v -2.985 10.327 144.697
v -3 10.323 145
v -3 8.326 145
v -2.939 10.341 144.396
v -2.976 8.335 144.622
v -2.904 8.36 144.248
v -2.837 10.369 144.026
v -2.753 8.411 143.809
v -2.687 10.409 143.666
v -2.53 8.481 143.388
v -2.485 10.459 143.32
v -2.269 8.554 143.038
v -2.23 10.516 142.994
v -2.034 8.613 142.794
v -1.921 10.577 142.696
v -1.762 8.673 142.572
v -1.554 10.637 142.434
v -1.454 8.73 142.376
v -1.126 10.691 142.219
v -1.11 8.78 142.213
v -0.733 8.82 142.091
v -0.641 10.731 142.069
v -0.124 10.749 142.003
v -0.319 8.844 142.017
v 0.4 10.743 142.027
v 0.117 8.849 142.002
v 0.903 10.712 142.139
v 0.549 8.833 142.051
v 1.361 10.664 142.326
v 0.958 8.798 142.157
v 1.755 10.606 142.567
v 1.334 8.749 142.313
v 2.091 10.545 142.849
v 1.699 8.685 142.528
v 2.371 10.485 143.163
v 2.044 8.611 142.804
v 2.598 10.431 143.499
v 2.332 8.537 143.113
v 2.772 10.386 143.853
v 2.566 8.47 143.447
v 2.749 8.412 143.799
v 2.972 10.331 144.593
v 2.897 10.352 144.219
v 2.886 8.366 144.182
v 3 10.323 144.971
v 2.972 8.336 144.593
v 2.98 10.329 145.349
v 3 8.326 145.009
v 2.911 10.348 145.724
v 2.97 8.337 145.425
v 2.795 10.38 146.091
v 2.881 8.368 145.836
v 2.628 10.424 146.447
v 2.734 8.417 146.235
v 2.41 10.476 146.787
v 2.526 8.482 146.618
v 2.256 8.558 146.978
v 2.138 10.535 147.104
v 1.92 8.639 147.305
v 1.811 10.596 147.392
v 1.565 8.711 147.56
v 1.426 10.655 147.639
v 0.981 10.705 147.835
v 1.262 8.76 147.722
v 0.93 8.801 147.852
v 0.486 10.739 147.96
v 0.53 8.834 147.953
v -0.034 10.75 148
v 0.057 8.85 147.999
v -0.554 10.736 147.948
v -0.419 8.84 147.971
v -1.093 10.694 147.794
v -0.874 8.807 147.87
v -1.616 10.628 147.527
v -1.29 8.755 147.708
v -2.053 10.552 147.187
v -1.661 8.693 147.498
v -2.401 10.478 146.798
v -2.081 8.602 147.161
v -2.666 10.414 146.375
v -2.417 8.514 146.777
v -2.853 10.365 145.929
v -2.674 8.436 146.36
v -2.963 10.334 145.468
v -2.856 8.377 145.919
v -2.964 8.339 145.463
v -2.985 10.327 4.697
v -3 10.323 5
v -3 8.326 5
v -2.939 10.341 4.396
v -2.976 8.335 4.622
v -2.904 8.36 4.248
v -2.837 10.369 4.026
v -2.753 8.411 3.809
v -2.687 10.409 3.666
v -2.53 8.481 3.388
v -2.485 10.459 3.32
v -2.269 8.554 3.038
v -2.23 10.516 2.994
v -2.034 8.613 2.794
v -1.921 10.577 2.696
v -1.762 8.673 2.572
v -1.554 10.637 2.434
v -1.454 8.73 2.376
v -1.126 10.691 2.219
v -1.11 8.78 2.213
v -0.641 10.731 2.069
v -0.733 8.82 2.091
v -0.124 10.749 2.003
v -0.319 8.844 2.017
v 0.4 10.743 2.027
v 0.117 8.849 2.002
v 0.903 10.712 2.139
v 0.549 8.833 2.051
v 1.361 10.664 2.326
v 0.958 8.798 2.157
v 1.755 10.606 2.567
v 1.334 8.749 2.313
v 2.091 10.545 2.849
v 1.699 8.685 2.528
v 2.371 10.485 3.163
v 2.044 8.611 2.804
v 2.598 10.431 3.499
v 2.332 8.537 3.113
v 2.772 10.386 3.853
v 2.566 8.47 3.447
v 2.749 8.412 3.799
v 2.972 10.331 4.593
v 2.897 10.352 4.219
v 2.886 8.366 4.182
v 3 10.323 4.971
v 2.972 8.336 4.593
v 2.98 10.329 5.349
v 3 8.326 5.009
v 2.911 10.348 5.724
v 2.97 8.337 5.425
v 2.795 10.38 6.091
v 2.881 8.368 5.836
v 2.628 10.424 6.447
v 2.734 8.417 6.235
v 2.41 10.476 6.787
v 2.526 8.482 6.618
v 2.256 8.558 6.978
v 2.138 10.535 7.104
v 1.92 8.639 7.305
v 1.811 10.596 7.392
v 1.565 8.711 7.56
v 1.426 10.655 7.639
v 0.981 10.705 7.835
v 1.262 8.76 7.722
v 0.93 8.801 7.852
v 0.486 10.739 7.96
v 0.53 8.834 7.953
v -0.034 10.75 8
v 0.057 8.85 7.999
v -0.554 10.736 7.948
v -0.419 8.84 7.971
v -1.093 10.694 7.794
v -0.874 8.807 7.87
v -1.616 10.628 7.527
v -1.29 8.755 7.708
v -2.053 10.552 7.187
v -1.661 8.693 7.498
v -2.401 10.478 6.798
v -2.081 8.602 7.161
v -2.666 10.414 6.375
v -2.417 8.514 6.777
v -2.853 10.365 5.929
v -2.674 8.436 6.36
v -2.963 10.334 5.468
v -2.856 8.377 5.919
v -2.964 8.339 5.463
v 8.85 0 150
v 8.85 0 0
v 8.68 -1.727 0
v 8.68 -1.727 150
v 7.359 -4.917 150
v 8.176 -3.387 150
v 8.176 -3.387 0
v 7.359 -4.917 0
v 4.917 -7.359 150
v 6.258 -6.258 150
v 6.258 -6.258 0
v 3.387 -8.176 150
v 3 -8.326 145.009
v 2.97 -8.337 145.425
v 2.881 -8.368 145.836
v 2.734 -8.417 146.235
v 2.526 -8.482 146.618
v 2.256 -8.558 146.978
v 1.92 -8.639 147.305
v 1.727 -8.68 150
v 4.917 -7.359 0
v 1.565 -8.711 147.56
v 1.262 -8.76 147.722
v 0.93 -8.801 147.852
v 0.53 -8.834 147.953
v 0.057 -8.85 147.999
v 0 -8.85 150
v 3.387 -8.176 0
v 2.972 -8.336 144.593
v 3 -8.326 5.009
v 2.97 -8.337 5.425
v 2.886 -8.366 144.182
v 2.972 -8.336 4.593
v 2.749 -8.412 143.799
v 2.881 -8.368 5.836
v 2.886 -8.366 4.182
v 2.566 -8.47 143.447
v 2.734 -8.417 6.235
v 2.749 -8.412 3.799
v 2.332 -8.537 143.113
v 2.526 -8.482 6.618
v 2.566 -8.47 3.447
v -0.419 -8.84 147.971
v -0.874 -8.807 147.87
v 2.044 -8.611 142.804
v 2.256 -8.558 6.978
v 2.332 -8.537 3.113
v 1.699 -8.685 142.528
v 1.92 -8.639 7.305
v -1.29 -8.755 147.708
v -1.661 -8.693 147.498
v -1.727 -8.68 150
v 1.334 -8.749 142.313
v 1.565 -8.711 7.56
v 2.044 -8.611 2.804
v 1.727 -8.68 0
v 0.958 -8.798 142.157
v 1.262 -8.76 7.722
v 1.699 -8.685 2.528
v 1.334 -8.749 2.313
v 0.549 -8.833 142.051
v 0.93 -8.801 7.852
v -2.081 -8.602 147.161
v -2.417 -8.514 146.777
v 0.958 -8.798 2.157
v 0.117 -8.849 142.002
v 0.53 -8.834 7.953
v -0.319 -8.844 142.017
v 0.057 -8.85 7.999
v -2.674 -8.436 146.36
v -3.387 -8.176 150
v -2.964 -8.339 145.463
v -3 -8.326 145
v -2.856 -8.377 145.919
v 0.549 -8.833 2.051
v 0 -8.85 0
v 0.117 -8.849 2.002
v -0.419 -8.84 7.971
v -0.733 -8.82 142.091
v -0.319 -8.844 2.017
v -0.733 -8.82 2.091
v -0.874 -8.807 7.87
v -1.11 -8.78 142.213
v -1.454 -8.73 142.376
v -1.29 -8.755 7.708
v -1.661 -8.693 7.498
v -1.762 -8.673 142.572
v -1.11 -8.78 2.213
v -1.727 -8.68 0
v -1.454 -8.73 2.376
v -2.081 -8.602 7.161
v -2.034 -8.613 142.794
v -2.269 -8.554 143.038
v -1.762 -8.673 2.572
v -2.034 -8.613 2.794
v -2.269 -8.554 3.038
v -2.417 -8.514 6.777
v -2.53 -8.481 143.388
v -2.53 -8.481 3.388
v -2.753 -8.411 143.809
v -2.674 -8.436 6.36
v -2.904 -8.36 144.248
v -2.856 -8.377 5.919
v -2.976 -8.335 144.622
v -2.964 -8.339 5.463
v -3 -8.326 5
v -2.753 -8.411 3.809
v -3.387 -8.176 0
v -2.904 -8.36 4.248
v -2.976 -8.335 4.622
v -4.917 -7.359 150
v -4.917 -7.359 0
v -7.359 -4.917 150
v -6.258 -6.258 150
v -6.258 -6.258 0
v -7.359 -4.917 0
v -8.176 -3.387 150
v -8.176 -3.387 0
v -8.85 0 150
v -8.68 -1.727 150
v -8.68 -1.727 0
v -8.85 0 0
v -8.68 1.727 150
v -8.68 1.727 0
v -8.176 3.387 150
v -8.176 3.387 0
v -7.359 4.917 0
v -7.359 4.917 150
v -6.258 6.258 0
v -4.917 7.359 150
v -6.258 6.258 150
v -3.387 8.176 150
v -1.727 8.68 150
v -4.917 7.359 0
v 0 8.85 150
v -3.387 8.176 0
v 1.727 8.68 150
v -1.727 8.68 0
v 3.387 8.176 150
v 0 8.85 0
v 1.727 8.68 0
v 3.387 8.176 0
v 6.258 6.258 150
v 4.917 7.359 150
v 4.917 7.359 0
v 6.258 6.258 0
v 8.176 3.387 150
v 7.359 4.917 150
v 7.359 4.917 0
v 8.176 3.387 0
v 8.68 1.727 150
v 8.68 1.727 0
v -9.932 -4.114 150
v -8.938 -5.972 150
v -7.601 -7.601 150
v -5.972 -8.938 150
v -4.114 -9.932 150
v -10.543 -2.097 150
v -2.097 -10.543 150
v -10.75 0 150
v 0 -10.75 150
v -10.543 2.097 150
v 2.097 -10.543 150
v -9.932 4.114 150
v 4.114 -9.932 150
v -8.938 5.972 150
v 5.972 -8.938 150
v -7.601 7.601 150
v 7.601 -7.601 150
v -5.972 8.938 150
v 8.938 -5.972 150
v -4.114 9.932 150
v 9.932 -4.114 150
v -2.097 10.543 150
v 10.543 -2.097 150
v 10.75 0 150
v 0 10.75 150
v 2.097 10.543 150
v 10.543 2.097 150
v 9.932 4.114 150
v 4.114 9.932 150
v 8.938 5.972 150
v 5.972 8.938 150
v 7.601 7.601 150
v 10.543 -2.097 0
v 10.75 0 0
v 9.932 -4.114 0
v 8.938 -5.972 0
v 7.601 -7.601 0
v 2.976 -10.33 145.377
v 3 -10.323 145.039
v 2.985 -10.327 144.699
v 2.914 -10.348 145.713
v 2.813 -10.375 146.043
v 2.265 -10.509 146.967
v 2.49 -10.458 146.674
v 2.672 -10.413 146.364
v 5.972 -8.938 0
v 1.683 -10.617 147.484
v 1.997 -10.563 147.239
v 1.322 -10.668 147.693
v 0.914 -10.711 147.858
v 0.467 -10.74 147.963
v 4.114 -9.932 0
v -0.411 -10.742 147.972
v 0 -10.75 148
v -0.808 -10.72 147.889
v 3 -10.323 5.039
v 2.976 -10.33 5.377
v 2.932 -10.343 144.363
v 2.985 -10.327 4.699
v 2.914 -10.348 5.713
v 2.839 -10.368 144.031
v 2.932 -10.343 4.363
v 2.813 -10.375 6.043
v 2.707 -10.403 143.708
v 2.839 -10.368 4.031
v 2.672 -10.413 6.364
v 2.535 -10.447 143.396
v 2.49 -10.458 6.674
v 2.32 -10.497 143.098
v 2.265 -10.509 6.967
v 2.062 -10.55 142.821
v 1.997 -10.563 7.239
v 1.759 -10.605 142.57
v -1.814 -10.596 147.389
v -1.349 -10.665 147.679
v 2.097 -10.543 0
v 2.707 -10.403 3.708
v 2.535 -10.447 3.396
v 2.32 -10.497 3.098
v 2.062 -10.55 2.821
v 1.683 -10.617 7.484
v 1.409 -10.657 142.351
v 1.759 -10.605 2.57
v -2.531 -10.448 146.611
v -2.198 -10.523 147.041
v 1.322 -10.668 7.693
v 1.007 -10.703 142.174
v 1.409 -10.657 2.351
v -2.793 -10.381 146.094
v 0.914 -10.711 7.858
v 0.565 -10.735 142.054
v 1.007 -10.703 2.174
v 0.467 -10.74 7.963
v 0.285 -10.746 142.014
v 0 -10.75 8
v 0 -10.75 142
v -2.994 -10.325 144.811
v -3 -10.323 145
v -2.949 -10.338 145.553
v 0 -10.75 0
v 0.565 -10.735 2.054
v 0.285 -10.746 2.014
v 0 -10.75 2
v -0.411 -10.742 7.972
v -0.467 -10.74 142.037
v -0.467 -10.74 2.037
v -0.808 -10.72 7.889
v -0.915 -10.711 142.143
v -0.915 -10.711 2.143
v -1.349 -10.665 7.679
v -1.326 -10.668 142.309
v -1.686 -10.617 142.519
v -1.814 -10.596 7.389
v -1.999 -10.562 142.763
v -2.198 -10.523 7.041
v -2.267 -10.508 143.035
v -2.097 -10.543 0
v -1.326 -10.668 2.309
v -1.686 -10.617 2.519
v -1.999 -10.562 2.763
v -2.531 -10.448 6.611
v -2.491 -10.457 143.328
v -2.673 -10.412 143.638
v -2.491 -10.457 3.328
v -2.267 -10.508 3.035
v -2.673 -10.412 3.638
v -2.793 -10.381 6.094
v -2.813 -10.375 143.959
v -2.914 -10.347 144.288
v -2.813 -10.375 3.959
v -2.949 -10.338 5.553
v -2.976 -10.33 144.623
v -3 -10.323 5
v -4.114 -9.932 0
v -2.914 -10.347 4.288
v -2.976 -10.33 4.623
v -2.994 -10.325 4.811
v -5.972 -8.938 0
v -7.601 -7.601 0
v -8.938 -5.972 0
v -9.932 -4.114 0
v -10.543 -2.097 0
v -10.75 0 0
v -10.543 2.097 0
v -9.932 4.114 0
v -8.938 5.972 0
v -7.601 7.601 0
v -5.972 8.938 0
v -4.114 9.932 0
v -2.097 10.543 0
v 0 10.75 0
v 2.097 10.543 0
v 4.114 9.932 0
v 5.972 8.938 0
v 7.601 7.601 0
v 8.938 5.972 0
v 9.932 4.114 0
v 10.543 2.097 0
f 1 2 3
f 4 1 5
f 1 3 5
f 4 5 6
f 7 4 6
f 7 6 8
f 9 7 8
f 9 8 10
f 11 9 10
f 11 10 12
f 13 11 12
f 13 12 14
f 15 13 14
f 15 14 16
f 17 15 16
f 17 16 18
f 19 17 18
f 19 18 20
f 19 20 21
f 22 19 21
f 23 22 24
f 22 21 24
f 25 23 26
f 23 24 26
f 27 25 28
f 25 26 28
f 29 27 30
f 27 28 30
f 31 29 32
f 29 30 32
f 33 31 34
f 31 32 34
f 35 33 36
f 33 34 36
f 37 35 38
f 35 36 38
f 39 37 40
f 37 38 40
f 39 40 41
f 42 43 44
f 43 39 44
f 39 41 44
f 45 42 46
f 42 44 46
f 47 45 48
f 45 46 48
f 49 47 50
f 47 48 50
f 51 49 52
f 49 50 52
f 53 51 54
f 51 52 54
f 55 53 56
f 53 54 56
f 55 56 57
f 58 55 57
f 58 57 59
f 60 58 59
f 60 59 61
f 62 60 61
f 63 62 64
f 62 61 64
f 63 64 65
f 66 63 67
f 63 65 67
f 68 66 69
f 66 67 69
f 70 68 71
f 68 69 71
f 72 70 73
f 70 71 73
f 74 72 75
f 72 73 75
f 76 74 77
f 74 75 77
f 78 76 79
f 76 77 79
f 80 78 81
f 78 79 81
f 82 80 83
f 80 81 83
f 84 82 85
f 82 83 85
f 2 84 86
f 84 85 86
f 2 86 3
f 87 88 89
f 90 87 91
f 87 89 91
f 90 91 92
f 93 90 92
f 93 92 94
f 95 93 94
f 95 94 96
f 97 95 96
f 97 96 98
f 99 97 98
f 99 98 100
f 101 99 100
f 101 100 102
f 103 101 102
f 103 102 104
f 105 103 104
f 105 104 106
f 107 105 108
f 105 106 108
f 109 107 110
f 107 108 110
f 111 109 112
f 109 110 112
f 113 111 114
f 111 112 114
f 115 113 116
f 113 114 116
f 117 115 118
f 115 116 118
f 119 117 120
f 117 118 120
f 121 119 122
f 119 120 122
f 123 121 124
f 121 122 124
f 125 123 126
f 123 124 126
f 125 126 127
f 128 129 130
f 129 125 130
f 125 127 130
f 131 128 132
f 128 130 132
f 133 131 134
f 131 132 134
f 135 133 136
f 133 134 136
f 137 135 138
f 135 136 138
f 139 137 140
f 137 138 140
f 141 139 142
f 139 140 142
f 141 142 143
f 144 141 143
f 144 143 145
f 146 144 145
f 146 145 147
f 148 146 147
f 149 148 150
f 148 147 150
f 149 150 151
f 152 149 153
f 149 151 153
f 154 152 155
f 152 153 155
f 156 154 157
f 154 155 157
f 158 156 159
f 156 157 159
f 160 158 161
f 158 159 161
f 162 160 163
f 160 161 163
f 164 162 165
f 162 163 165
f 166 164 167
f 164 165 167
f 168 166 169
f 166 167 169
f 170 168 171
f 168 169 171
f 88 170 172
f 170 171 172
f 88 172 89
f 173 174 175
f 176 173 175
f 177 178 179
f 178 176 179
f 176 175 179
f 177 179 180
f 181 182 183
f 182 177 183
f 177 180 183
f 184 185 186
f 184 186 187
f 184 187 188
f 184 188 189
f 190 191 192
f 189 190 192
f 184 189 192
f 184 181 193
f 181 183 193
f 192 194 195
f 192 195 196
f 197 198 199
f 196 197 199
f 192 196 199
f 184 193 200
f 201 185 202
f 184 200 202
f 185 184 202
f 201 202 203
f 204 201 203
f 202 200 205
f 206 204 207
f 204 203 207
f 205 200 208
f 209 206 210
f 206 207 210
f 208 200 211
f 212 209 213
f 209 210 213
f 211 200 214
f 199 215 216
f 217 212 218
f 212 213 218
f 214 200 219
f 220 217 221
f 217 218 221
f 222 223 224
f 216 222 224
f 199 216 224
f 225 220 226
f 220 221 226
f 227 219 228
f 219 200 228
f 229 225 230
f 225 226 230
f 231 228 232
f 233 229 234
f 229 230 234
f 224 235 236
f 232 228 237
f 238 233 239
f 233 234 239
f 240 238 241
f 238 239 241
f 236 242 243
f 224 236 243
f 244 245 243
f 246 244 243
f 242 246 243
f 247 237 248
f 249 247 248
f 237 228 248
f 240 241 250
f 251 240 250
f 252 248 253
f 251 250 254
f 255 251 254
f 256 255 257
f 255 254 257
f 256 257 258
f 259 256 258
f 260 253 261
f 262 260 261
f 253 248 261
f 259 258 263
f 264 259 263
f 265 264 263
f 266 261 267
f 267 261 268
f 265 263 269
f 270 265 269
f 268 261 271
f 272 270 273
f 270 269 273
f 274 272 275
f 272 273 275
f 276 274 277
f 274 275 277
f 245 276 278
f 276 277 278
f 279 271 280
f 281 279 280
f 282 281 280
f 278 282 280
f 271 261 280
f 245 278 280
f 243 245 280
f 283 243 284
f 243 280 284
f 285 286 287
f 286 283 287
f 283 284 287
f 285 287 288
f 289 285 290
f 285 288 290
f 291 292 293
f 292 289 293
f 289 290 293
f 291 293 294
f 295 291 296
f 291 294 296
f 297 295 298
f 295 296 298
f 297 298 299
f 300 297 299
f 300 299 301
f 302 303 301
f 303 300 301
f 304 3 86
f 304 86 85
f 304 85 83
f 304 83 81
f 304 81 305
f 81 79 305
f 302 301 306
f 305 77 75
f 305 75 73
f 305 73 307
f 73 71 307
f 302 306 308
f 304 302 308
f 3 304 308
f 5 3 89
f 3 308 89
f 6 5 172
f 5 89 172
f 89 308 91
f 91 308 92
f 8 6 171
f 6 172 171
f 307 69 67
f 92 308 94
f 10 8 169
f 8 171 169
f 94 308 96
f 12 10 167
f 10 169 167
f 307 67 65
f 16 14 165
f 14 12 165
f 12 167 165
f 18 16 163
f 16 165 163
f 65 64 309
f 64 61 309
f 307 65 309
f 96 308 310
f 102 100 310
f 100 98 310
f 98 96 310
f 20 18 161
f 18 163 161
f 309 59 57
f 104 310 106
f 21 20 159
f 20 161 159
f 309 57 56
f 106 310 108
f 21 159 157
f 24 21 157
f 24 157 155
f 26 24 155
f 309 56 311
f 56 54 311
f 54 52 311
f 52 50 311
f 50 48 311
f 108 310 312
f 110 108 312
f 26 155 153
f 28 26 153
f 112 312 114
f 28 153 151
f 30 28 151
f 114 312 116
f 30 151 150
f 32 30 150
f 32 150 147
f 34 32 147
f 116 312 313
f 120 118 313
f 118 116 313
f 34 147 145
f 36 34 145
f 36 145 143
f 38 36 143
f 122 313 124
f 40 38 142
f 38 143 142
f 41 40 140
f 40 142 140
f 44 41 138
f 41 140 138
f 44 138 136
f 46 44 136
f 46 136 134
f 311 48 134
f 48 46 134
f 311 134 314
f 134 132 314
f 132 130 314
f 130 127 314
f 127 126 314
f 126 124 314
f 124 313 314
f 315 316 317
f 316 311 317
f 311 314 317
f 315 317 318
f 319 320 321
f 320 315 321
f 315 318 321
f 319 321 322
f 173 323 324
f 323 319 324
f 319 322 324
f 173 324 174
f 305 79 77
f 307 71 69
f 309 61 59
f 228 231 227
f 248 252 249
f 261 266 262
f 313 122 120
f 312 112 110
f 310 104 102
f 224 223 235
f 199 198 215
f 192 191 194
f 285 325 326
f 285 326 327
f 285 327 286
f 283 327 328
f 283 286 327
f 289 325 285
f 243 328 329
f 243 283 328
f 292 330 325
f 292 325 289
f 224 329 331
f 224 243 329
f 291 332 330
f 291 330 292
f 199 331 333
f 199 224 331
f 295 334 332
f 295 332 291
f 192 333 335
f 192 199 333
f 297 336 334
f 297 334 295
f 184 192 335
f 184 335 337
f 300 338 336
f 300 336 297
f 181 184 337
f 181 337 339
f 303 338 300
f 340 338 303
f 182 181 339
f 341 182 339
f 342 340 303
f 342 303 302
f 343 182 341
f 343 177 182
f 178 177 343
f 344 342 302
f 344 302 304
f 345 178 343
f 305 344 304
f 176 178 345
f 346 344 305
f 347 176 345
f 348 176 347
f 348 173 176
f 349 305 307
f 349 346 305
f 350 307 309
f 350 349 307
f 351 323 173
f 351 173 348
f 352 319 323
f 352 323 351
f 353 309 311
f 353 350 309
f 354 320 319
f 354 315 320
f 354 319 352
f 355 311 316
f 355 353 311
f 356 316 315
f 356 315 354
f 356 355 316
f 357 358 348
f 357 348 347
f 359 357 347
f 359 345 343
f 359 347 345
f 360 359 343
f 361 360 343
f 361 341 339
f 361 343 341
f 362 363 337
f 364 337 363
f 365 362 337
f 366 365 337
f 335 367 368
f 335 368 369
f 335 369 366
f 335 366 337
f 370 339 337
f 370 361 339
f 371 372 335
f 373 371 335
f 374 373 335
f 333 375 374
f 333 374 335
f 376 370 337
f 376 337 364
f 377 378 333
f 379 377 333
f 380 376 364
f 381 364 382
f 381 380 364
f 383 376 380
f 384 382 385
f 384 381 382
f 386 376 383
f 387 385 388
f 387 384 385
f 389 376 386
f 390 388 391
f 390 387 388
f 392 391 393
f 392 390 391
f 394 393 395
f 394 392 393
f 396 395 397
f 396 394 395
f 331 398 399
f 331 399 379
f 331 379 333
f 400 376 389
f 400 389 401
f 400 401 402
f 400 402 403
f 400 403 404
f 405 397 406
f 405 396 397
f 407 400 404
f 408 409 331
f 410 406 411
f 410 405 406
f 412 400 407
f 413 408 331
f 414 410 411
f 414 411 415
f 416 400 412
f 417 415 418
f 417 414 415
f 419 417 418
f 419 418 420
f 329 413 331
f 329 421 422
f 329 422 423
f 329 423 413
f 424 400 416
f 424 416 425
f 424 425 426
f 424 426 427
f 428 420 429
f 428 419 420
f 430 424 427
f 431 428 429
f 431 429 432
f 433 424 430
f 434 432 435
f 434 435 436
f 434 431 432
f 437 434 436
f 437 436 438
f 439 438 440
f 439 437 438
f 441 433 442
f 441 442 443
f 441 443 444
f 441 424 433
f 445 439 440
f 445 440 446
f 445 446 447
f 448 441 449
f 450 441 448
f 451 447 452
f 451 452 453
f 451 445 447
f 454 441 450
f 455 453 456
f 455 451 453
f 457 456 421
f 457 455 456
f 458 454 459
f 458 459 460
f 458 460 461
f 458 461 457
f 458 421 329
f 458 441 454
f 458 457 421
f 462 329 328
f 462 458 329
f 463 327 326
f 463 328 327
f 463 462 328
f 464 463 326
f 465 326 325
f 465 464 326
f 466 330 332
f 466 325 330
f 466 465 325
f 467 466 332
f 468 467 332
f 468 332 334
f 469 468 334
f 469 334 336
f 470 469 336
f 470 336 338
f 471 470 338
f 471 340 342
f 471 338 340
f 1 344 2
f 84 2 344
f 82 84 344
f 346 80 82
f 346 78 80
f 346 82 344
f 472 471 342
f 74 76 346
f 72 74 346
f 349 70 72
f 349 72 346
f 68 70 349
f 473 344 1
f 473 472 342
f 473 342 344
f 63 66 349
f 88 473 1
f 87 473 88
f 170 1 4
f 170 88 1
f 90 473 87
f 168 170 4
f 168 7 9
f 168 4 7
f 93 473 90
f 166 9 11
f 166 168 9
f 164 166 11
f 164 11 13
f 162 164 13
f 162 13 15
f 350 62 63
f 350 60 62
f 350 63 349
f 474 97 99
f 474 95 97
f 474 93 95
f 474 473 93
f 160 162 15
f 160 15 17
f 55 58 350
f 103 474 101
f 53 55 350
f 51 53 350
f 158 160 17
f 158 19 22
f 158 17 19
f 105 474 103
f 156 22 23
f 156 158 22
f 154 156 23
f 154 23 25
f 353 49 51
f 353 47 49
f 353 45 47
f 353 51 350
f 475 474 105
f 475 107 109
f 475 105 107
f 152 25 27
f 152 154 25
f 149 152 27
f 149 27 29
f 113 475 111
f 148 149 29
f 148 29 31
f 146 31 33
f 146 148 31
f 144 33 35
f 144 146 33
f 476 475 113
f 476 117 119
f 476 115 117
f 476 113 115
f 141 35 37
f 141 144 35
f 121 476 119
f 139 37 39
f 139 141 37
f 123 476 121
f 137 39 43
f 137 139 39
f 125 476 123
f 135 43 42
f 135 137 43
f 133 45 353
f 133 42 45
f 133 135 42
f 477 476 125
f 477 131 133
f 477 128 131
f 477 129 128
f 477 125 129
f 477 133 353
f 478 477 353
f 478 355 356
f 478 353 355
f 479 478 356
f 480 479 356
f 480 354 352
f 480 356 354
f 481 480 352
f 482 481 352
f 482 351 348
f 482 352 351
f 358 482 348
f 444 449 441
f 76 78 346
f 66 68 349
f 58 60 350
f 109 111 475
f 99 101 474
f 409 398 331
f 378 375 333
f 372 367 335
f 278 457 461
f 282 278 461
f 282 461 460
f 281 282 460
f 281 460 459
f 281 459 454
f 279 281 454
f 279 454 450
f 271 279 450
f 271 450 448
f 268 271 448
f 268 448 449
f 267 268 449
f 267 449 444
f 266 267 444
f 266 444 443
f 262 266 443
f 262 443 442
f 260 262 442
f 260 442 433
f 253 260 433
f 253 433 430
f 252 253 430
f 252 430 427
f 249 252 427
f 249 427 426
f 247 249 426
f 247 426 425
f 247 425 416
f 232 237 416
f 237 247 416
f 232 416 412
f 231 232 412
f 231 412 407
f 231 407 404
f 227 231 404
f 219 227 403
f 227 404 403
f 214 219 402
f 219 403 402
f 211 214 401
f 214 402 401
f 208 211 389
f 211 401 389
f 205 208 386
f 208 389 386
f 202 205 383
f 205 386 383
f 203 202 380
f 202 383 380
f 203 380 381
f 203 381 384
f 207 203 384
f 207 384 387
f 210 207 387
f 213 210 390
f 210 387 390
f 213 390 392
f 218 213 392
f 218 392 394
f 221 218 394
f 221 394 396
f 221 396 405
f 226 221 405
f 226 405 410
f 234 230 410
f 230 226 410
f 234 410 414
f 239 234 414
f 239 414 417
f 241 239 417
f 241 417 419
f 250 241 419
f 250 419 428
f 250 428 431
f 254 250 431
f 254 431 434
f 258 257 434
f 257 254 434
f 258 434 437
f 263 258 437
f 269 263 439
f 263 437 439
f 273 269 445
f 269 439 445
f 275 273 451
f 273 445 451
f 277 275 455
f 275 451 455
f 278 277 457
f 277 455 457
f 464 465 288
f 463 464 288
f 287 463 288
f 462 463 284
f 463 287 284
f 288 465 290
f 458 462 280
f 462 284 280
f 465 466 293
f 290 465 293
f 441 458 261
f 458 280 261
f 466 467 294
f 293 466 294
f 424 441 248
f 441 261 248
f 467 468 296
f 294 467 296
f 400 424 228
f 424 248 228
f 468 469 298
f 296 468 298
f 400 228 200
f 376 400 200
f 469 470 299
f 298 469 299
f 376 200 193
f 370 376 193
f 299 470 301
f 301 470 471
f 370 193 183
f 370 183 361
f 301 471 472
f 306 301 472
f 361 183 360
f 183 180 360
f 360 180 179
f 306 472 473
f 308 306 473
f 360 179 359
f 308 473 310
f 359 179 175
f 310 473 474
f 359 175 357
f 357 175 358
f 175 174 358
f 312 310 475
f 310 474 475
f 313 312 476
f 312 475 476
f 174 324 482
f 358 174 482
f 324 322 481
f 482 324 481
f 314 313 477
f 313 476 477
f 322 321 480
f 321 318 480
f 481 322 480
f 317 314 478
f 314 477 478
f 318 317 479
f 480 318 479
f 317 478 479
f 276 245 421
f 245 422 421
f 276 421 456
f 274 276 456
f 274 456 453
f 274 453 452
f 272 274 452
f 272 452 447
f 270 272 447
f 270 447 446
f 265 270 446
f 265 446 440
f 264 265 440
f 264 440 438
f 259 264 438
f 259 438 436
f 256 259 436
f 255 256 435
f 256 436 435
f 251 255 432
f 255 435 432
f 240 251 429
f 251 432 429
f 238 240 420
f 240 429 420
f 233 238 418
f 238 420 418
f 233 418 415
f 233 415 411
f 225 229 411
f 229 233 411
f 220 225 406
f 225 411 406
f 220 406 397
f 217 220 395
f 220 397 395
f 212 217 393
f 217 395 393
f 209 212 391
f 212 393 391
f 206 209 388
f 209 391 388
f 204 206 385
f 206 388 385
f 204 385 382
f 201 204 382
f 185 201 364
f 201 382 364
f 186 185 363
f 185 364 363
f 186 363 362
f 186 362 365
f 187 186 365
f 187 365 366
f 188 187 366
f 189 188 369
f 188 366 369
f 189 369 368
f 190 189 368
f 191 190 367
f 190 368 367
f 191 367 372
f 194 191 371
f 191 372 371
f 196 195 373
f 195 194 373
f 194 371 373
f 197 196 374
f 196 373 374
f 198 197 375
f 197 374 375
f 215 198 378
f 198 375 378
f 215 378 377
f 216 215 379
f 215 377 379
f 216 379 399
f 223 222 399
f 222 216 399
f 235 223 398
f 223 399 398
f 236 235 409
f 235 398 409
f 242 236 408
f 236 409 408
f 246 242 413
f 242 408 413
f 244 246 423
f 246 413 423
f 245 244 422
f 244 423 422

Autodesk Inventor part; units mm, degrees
ref_plane "YZ Plane" through (0, 0, 0) normal (1, 0, 0) x (0, 1, 0)
ref_plane "XY Plane" through (0, 0, 0) normal (0, 0, 1) x (1, 0, 0)
sketch "Sketch1" plane through (0, 0, 0) normal (0, 0, 1) x (1, 0, 0)
  circle A0 centre (0, 0) radius 10.75
  circle A1 centre (0, 0) radius 8.85
  dimension "d0" = 21.5
  dimension "d1" = 17.7
extrude "Extrusion1" add sketch "Sketch1" along normal blind 150
ref_plane "Work Plane1" through (0, -10.75, 0) normal (0, 1, 0) x (-1, 0, 0)
sketch "Sketch2" plane through (0, -10.75, 0) normal (0, 1, 0) x (-1, 0, 0)
  circle A0 centre (0, 5) radius 3
  line L0 (0, -39.6) -> (0, 237.6) projected
  line L1 (10.75, 0) -> (-10.75, 0) projected
  circle A1 centre (0, 145) radius 3
  line L2 (10.75, 150) -> (-10.75, 150) projected
  point P0 (0, 0)
  dimension "d4" = 6
  dimension "d5" = 5
  dimension "d8" = 6
  dimension "d9" = 5
extrude "Extrusion2" cut sketch "Sketch2" along normal through all
properties part number "Shifter Post" material "PVC-Piping"
